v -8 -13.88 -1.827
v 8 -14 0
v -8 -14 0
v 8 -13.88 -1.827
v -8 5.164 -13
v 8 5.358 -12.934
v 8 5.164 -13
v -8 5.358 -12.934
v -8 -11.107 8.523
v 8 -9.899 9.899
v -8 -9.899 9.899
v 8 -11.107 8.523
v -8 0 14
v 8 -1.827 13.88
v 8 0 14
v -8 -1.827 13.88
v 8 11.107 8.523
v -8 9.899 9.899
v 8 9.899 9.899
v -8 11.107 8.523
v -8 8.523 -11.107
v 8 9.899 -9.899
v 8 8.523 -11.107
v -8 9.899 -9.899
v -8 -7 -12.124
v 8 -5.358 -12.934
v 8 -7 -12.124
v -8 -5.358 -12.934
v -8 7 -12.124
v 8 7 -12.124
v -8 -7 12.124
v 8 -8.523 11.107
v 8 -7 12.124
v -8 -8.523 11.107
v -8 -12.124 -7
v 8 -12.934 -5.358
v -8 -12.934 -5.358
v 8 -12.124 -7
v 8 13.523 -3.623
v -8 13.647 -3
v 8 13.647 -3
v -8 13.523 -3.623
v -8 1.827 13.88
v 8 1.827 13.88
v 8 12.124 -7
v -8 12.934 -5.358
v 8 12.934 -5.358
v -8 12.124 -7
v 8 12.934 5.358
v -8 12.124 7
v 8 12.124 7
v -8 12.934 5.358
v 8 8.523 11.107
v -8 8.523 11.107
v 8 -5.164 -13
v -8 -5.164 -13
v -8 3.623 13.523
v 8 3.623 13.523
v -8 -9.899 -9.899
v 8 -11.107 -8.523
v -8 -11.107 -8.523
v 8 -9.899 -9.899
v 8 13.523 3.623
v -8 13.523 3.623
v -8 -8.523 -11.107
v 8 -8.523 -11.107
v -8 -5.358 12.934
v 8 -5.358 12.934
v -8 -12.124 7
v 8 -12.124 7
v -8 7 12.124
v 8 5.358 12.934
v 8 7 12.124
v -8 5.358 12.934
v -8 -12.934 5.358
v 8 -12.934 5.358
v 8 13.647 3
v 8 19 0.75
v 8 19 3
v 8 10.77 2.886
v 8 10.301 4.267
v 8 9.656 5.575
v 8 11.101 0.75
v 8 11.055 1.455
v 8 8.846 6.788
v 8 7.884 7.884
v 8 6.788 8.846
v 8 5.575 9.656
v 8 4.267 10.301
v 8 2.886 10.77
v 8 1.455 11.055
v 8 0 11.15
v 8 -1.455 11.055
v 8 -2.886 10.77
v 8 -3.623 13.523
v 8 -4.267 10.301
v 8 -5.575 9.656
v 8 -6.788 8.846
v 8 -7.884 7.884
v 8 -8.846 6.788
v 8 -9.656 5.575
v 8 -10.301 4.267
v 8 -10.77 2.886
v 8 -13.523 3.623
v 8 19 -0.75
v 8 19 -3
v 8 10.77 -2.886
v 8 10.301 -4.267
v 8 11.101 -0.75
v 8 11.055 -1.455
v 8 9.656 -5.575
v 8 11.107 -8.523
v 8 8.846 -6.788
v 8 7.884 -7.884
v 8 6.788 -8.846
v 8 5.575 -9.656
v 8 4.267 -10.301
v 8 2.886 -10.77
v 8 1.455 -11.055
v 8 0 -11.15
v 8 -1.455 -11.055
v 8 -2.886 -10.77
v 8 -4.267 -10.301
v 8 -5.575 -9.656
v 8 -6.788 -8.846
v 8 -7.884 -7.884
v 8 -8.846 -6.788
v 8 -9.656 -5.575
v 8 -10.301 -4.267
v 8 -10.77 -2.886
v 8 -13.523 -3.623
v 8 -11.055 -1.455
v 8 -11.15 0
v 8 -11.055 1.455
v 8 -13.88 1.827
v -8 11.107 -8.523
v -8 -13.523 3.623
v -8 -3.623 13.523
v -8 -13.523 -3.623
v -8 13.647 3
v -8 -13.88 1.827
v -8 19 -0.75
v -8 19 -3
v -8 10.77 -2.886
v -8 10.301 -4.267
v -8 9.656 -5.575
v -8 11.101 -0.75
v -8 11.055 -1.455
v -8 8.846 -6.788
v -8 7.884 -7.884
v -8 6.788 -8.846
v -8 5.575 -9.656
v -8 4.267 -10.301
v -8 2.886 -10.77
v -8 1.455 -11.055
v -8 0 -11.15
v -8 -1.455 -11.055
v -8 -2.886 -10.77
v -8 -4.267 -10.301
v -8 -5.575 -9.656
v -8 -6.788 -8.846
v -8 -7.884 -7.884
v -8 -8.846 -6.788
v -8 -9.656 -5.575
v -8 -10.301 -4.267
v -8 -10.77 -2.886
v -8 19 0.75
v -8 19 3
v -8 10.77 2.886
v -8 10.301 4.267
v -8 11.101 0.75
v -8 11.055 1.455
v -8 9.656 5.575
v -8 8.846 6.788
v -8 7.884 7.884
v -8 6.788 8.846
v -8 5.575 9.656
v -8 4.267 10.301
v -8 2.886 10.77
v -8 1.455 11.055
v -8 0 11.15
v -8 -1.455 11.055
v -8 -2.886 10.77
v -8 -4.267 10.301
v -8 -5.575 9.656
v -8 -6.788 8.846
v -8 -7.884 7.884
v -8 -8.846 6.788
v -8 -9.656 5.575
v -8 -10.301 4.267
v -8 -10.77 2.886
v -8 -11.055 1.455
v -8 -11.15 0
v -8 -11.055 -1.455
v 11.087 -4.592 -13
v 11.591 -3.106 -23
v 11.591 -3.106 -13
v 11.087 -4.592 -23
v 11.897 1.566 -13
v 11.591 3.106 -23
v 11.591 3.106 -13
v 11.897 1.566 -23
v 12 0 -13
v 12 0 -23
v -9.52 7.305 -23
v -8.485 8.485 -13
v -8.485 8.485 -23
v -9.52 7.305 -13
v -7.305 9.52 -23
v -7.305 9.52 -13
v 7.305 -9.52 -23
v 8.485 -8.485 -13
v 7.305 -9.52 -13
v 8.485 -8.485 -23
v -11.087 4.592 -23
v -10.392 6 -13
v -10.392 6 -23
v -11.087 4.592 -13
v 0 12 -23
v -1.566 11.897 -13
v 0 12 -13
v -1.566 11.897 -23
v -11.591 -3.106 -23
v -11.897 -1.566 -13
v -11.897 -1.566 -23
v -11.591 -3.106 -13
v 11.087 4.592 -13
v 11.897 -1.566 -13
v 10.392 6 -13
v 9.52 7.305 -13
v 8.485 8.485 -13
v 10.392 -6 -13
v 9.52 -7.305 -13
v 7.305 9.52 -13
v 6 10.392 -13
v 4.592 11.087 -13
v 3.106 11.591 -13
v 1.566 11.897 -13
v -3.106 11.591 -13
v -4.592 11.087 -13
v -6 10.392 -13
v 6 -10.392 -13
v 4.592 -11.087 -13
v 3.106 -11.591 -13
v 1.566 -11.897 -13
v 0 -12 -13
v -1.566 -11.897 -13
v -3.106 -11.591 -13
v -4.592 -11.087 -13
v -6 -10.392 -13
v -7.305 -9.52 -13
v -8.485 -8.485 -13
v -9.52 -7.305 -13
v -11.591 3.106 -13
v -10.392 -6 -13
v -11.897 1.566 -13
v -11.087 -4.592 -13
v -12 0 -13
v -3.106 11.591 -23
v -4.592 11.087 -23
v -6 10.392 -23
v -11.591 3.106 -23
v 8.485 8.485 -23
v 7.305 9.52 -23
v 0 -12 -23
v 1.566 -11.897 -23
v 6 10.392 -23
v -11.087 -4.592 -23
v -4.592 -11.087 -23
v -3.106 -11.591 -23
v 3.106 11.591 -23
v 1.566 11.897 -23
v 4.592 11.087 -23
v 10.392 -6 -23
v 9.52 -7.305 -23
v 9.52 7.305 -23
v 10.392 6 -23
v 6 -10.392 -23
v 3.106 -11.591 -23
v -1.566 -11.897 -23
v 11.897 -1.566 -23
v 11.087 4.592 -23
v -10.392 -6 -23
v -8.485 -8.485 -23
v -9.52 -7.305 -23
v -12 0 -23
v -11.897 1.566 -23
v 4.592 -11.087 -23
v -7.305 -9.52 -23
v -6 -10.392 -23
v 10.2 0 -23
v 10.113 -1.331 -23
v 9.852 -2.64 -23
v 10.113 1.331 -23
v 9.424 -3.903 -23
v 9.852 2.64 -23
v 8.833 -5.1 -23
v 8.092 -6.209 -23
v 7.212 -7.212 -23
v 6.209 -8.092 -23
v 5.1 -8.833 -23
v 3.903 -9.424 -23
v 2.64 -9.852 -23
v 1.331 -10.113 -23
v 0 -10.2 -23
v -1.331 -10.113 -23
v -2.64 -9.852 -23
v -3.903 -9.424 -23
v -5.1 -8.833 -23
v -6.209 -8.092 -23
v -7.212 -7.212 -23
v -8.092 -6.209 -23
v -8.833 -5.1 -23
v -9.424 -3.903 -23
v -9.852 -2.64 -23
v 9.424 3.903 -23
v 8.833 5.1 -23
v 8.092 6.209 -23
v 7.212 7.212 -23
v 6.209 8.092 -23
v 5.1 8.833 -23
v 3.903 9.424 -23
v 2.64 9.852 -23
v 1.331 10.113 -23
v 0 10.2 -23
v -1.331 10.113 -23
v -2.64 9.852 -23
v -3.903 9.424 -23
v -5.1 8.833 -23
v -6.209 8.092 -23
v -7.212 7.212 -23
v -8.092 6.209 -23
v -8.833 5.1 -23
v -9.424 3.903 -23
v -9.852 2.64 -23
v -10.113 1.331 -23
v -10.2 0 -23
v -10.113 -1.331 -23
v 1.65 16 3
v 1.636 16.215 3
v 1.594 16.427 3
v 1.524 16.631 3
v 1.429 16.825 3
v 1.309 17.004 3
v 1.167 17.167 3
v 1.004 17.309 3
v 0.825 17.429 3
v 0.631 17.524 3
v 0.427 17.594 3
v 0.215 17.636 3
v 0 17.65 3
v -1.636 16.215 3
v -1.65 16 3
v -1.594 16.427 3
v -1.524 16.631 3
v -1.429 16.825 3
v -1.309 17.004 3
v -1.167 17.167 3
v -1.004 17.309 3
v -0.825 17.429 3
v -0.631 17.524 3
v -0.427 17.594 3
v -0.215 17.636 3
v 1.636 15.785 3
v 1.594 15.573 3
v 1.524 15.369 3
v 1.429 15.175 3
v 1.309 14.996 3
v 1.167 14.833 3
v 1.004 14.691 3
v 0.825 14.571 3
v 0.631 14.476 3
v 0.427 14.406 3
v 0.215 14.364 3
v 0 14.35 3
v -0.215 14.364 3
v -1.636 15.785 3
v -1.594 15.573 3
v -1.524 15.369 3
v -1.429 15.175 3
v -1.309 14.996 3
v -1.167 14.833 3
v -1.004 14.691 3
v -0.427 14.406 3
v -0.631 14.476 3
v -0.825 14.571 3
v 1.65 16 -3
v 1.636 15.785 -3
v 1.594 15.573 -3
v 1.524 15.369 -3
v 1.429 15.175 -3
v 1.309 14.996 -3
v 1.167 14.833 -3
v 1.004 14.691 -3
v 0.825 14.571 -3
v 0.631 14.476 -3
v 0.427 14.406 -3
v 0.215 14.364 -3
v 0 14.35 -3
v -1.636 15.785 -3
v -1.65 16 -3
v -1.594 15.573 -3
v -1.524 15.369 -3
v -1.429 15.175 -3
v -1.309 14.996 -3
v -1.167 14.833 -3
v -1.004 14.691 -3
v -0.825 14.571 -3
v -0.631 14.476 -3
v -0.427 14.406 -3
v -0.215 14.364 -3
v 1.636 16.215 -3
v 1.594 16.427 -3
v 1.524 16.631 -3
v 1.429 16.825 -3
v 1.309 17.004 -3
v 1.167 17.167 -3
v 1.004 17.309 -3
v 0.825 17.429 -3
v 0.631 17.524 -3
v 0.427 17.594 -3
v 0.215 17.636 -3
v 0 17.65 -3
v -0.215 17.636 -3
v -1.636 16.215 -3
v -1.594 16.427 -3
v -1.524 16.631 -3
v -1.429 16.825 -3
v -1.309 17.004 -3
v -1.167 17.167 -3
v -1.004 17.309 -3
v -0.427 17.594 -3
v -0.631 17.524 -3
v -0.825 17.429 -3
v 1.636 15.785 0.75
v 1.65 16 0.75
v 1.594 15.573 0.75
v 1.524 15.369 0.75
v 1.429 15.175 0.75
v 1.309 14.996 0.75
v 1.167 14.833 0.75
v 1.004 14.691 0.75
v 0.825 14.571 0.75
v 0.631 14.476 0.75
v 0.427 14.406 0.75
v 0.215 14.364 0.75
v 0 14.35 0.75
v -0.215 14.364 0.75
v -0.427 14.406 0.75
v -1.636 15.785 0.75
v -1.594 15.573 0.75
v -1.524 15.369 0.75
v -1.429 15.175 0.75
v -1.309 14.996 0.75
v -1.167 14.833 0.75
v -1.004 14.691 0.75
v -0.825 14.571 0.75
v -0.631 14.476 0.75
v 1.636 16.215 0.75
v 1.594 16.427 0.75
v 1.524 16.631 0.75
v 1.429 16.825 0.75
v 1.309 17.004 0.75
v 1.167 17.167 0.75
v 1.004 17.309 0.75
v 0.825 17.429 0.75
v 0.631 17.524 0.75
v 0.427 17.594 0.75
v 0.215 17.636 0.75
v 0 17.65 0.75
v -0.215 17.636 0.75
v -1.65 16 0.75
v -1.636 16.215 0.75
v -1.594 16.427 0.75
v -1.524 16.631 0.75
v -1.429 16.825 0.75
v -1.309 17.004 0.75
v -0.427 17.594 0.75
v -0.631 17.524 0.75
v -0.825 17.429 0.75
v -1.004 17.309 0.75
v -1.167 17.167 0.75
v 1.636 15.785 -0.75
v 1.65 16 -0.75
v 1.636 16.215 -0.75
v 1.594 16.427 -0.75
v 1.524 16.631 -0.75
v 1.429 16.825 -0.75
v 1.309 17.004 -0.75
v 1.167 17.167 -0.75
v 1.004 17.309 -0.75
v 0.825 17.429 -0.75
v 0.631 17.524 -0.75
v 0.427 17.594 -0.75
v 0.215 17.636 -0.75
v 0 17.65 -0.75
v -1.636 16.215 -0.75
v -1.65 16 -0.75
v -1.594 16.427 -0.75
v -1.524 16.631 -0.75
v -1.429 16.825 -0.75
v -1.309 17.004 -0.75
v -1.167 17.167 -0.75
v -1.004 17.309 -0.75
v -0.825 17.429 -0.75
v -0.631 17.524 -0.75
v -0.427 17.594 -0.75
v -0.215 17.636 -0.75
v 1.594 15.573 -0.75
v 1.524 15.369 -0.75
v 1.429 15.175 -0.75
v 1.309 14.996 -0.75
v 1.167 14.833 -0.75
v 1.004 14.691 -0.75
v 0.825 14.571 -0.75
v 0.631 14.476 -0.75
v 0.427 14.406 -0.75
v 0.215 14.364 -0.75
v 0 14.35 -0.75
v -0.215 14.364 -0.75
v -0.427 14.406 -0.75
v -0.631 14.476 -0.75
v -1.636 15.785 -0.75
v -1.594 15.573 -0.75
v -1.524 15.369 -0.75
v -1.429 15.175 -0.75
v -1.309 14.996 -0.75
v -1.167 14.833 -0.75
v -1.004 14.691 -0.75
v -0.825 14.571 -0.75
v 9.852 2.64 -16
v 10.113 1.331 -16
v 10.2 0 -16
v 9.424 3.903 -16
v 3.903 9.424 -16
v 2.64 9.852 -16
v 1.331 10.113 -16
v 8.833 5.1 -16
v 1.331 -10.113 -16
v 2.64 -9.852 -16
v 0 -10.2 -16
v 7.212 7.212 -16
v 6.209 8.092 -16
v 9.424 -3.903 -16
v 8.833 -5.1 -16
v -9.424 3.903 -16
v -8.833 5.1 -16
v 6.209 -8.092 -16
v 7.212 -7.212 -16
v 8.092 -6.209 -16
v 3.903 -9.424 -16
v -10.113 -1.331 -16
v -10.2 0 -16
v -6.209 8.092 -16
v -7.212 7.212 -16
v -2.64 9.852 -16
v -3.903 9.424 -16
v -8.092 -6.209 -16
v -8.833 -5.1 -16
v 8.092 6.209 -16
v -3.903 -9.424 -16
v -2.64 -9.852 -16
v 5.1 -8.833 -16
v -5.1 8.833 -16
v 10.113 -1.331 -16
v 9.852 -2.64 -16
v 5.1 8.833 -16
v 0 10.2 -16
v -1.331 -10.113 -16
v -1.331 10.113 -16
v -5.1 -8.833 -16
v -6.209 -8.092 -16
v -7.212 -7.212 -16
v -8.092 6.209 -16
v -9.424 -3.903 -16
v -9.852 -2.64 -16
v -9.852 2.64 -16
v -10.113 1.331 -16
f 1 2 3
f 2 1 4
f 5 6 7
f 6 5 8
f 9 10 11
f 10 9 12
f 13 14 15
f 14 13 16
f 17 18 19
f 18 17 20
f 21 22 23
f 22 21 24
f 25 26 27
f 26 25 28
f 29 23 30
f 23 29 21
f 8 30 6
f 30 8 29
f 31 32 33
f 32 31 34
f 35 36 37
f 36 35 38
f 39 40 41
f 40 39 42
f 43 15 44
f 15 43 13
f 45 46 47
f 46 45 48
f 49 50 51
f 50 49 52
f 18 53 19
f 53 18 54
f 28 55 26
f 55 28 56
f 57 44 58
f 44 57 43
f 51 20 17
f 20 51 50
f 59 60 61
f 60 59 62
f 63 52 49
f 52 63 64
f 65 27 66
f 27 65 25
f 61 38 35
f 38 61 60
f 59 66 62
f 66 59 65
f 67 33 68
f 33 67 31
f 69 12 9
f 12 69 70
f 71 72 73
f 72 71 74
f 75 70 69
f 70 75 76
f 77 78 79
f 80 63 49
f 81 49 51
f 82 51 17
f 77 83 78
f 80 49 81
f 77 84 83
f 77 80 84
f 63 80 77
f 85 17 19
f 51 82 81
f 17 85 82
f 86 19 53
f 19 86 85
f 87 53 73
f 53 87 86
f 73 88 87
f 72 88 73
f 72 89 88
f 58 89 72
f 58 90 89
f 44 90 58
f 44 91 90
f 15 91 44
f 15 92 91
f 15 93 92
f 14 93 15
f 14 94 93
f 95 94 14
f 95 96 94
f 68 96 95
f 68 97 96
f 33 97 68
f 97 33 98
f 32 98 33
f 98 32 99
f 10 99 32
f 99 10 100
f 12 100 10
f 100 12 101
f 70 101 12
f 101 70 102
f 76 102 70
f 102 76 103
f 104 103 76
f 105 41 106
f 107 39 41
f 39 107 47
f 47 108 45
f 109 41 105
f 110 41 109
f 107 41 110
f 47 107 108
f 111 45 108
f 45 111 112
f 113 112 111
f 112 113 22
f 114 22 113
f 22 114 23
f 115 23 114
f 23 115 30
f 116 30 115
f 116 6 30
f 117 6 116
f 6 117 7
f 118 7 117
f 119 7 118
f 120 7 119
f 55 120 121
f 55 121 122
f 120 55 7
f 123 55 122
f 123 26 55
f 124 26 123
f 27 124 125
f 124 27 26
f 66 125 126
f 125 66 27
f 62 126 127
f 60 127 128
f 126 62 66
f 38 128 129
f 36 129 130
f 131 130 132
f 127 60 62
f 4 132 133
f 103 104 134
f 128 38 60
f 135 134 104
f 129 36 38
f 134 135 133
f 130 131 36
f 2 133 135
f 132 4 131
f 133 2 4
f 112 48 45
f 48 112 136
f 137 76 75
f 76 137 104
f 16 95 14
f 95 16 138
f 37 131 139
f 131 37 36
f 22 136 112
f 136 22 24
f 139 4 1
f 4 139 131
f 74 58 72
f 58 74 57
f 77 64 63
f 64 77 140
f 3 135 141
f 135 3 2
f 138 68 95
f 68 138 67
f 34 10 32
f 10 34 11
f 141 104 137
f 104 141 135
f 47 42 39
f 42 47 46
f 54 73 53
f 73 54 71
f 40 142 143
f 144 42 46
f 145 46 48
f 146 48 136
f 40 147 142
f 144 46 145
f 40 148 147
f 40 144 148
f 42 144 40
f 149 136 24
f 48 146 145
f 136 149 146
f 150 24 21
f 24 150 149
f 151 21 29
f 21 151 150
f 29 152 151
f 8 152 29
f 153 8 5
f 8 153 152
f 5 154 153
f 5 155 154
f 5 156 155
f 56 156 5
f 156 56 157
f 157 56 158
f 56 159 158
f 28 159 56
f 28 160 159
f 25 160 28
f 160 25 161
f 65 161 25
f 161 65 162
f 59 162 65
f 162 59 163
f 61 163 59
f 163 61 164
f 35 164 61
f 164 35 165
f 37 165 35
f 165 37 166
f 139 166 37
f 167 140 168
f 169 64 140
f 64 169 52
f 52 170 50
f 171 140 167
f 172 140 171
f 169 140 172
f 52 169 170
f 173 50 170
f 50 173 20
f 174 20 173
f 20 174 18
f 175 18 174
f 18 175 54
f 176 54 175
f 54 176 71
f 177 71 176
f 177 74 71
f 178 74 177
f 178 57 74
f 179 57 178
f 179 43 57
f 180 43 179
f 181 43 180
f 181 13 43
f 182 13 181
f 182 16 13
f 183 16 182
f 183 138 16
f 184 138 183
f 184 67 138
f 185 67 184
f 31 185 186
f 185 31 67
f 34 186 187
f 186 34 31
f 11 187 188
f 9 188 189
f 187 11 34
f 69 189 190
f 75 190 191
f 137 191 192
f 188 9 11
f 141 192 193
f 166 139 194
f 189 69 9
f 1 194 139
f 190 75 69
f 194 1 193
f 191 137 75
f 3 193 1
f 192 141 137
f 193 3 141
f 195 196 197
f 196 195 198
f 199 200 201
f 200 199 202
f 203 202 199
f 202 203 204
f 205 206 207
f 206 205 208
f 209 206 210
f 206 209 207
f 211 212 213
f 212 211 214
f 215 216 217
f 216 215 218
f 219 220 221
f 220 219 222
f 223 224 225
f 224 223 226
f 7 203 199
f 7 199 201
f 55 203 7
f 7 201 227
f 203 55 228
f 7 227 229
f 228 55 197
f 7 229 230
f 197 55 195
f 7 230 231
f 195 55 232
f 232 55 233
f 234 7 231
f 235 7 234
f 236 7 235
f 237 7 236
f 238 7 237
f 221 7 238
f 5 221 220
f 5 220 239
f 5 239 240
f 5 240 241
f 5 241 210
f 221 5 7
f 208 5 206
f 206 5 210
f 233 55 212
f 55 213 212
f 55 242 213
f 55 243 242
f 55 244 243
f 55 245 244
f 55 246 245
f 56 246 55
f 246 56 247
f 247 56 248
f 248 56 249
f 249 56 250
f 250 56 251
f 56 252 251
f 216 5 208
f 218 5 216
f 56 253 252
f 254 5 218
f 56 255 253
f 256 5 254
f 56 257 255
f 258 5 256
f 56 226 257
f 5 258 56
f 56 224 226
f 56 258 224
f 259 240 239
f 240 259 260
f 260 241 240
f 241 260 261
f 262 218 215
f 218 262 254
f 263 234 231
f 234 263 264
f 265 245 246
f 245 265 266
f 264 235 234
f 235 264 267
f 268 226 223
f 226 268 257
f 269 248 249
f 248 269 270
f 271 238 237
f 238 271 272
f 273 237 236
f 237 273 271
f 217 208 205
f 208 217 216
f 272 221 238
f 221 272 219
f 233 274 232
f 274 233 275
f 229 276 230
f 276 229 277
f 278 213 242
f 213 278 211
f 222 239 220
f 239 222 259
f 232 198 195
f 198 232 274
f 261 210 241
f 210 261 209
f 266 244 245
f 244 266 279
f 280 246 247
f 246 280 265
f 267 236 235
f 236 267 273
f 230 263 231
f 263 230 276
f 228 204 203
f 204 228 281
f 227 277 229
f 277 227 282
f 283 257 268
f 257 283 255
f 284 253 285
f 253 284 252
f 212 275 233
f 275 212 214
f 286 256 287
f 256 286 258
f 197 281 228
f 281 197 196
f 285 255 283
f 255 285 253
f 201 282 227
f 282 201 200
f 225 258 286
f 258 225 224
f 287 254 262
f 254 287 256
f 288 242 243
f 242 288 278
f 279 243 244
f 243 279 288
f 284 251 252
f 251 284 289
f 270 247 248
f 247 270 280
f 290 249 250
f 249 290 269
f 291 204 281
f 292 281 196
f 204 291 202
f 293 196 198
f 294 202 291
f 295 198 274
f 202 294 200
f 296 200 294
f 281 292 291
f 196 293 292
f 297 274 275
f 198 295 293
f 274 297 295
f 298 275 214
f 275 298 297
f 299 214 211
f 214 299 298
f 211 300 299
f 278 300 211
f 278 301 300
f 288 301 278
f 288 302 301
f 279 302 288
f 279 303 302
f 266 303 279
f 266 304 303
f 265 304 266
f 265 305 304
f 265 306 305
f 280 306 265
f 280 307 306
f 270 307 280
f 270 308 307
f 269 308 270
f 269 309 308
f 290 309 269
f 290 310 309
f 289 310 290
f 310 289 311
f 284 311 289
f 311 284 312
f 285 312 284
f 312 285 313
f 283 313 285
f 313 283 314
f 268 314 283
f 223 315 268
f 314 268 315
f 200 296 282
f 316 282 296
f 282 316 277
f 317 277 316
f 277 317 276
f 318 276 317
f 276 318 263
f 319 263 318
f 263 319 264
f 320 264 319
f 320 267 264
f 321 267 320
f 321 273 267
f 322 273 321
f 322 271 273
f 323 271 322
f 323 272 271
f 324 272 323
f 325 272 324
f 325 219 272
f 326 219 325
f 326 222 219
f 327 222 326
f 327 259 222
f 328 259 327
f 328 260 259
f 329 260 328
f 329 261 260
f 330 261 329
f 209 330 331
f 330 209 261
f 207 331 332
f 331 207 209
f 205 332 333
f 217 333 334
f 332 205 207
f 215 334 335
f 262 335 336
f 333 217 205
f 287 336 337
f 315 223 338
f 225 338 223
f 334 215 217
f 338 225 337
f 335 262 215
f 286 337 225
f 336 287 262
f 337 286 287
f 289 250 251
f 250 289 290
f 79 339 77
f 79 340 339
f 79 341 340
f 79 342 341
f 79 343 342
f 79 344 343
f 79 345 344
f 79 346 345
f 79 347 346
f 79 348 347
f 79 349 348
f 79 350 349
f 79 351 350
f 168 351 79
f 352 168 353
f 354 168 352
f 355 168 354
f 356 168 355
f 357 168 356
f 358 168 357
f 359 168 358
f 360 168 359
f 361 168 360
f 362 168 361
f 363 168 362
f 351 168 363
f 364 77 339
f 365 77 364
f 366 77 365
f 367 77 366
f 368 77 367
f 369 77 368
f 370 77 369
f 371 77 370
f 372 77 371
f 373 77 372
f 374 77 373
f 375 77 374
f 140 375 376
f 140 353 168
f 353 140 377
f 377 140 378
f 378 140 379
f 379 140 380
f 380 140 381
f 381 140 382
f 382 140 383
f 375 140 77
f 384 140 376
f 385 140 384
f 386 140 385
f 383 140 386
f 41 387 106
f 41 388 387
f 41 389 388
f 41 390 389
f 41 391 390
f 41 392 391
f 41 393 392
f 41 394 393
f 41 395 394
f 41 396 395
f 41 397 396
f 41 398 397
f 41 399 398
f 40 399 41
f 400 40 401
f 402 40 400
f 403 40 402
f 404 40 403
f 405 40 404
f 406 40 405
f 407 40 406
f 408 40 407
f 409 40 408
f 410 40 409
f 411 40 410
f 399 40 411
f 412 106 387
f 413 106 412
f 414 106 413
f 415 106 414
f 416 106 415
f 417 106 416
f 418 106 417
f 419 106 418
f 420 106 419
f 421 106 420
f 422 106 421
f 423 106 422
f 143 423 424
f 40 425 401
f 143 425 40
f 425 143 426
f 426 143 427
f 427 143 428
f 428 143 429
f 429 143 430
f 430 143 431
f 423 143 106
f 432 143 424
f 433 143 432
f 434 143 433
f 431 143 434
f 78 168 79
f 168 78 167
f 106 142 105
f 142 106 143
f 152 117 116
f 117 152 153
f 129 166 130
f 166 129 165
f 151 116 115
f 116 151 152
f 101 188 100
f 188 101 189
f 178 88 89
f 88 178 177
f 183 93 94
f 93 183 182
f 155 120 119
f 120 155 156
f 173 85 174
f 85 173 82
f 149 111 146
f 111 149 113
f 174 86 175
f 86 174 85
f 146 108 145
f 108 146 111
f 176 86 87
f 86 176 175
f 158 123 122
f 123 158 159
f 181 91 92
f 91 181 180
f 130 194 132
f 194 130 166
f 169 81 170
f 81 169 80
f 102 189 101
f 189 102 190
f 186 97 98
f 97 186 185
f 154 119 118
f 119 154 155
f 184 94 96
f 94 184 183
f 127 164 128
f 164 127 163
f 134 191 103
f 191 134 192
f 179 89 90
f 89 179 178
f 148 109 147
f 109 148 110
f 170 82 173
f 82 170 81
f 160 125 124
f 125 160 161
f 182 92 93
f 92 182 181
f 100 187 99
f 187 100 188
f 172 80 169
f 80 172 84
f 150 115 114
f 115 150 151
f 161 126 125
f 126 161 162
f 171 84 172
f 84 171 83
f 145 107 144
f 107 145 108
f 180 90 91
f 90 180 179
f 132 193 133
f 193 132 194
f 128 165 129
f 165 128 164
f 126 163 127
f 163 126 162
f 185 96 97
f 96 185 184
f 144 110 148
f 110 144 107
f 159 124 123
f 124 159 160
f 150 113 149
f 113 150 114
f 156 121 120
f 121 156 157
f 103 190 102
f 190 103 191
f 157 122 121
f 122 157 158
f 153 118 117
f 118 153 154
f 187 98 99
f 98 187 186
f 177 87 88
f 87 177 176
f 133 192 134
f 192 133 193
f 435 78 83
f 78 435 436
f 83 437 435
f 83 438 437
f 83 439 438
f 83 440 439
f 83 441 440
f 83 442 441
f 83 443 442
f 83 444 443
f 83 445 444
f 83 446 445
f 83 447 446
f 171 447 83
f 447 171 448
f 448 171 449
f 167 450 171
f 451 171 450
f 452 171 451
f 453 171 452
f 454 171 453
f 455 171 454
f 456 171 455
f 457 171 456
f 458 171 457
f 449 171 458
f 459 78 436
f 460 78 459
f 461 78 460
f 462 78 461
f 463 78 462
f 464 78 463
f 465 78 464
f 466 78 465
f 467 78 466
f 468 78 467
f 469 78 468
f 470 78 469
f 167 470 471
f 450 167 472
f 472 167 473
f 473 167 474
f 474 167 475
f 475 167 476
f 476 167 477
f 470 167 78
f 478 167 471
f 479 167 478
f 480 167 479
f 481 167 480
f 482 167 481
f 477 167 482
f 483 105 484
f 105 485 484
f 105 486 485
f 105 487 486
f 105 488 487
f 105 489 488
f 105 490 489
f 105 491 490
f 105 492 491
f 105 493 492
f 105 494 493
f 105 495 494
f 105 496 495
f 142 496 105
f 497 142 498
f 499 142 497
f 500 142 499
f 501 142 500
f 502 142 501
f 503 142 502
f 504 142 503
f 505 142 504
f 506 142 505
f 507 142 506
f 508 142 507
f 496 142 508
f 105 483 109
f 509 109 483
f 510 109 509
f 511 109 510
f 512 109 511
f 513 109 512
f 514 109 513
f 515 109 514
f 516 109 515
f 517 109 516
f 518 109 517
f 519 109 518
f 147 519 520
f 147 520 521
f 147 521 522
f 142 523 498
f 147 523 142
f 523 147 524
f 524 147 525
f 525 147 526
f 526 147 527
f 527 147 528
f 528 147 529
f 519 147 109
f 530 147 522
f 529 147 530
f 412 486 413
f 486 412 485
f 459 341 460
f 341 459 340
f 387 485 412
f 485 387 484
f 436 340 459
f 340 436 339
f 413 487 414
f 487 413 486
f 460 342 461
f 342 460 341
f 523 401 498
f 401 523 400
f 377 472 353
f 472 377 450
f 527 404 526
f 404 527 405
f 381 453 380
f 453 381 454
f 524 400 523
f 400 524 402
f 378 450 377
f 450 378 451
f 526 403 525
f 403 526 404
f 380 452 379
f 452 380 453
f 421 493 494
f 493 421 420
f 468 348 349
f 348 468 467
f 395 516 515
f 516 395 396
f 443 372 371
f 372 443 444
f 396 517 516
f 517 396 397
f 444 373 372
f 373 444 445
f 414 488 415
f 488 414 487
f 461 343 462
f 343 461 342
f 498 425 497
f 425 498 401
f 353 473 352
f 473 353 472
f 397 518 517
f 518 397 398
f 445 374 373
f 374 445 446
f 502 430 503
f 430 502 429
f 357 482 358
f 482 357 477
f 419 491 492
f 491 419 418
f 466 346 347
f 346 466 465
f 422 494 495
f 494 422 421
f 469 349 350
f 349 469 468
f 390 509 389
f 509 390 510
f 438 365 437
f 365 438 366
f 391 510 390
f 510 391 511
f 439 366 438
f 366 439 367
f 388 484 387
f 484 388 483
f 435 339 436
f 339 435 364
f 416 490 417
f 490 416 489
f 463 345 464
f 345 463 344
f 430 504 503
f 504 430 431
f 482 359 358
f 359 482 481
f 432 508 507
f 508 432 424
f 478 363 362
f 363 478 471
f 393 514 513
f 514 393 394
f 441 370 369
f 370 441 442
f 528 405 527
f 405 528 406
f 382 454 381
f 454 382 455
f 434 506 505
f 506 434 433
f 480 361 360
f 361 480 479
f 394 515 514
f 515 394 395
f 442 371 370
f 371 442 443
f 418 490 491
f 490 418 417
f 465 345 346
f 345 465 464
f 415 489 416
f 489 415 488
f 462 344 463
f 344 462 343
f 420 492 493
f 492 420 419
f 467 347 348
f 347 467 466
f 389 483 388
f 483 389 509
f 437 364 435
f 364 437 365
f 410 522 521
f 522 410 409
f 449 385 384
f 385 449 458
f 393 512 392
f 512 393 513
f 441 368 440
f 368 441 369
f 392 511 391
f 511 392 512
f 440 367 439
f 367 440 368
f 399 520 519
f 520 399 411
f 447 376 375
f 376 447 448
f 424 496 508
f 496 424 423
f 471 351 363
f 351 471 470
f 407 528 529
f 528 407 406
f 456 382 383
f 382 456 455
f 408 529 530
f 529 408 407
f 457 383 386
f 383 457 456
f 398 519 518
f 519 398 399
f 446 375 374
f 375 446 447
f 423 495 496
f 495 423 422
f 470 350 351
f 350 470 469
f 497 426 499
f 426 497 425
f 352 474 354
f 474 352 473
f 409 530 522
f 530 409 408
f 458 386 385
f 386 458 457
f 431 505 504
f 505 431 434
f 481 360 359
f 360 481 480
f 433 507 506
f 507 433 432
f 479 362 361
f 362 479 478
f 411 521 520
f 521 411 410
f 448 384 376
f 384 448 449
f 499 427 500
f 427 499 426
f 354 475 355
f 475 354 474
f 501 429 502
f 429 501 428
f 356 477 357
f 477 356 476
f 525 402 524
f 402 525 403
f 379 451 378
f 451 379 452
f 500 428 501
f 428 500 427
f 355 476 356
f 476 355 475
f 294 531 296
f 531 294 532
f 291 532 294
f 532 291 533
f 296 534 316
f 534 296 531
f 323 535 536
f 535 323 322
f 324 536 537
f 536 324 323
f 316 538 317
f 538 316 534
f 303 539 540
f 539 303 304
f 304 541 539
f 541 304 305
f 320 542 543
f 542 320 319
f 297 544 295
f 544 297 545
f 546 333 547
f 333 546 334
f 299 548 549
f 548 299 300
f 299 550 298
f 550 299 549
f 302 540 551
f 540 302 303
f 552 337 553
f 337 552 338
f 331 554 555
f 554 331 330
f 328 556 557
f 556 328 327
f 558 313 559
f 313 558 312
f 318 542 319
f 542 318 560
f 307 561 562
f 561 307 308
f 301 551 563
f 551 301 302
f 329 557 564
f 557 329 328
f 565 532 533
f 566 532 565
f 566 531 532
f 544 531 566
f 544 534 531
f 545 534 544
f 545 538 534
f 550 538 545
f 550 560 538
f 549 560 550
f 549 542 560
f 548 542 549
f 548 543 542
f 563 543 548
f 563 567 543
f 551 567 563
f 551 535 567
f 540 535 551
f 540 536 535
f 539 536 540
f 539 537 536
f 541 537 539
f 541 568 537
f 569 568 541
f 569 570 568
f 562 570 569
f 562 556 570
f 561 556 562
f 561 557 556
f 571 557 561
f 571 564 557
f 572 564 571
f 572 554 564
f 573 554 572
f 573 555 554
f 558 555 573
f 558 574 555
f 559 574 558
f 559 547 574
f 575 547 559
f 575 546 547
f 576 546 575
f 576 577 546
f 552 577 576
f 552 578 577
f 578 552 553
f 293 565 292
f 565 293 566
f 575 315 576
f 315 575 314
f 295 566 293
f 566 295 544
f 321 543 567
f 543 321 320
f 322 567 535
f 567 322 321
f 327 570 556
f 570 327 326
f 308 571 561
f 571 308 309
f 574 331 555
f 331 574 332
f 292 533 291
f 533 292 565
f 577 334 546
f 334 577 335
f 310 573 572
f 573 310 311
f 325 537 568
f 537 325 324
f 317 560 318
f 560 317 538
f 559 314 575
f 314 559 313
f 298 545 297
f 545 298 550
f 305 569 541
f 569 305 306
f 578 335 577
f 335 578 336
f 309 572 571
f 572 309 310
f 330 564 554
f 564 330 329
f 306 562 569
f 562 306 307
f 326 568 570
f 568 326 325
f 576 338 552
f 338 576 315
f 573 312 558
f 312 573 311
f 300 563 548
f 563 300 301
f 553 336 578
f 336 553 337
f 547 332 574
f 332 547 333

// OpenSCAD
// file: ../common/ds_lib.scad
// DronSwarm · librería común de piezas del frame (S07-S08). Unidades: mm.
//
// Reglas (ADR-003): sin hull()/minkowski()/offset() — FreeCAD los convierte en malla y el STEP deja de ser un
// sólido válido. Las formas redondeadas se arman con uniones de cubos y cilindros. El importador CSG de FreeCAD
// también falla con booleanas 2D y con varios operandos agrupados bajo una sola transformación: cada grupo de
// agujeros debe ser hijo directo del difference(), con su propio translate.
//
// Interfaz de motor DronSwarm (DMI, ADR-011): placa con 4 ranuras radiales a 90°, de modo que el mismo soporte
// acepta varios patrones comerciales y, más adelante, el motor propio (S17+) se diseña para caer en el mismo rango.
//   DMI-S: 4×M3, círculo de tornillos Ø16-Ø25 (motores 28xx-41xx, ≤ 600 W)
//   DMI-L: 4×M4, círculo de tornillos Ø30-Ø42 (motores 50xx-70xx, ≤ 2 kW)

$fn = 48;

M3 = 3.3; M3_HEAD = 6.0; M3_NUT = 6.4;     // pasante, cabeza, tuerca (entre caras + juego)
M4 = 4.4; M4_HEAD = 7.5;
M5 = 5.4;

function dmi_bolt(iface) = iface == "L" ? M4 : M3;
function dmi_r(iface) = iface == "L" ? [15, 21] : [8, 12.5];   // radio mínimo y máximo de las ranuras
function dmi_plate_d(iface) = iface == "L" ? 56 : 36;
function dmi_center(iface) = iface == "L" ? 16 : 10;            // eje, seguro y paso de cables

// Rectángulo con esquinas redondeadas (2D) y su extrusión
module rrect2d(size, r) {
    r2 = min(r, size[0] / 2 - 0.01, size[1] / 2 - 0.01);
    union() {
        translate([r2, 0]) square([size[0] - 2 * r2, size[1]]);
        translate([0, r2]) square([size[0], size[1] - 2 * r2]);
        for (x = [r2, size[0] - r2], y = [r2, size[1] - r2]) translate([x, y]) circle(r = r2);
    }
}
// Caja redondeada con primitivas 3D (sin booleanas 2D: el importador CSG de FreeCAD falla con ellas)
module rbox(size, r) {
    r2 = min(r, size[0] / 2 - 0.01, size[1] / 2 - 0.01);
    union() {
        translate([r2, 0, 0]) cube([size[0] - 2 * r2, size[1], size[2]]);
        translate([0, r2, 0]) cube([size[0], size[1] - 2 * r2, size[2]]);
        for (x = [r2, size[0] - r2], y = [r2, size[1] - r2]) translate([x, y, 0]) cylinder(r = r2, h = size[2]);
    }
}
module crbox(size, r) { translate([-size[0] / 2, -size[1] / 2, 0]) rbox(size, r); }   // centrado en x/y

// Ranura (2D) entre dos puntos sobre el eje x
module slot2d(r0, r1, w) {
    union() {
        translate([r0, -w / 2]) square([r1 - r0, w]);
        translate([r0, 0]) circle(d = w);
        translate([r1, 0]) circle(d = w);
    }
}

// Agujeros de la interfaz de motor (para restar de una placa de espesor t)
module slot3d(r0, r1, w, h) {
    union() {
        translate([r0, -w / 2, 0]) cube([r1 - r0, w, h]);
        translate([r0, 0, 0]) cylinder(d = w, h = h);
        translate([r1, 0, 0]) cylinder(d = w, h = h);
    }
}
module dmi_holes(iface, t) {
    r = dmi_r(iface);
    translate([0, 0, -1]) union() {
        cylinder(d = dmi_center(iface), h = t + 2);
        for (a = [45, 135, 225, 315]) rotate(a) slot3d(r[0], r[1], dmi_bolt(iface), t + 2);
    }
}

// Soporte de motor en la punta del brazo: manguito sobre el tubo + placa DMI arriba
//   el tubo entra por -x; la placa queda centrada en el eje del motor (origen), cara superior en z = 0
module motor_mount(tube_d, iface = "S", sleeve = 34, wall = 3.5) {
    od = tube_d + 2 * wall;
    pd = dmi_plate_d(iface);
    pt = iface == "L" ? 6 : 4;
    zc = -pt - tube_d / 2 - 1;                 // eje del tubo bajo la placa
    difference() {
        union() {
            translate([0, 0, -pt]) cylinder(d = pd, h = pt);                         // placa DMI
            translate([-sleeve - pd / 2 + 6, 0, zc]) rotate([0, 90, 0])
                cylinder(d = od, h = sleeve + pd / 2 - 6 + 4);                       // manguito
            translate([-sleeve - pd / 2 + 6, -od / 2, zc]) cube([sleeve + pd / 2 - 2, od, -zc - pt + 0.01]);  // alma
            translate([-sleeve - pd / 2 + 6, -5, zc - od / 2 - 7]) cube([sleeve, 10, 8]);   // oreja de apriete
        }
        dmi_holes(iface, pt + 0.02, $fn = 32);
        translate([-sleeve - pd / 2 + 5, 0, zc]) rotate([0, 90, 0]) cylinder(d = tube_d + 0.3, h = sleeve + pd / 2 - 3); // tubo
        translate([-sleeve - pd / 2 + 4, -1, zc - od / 2 - 8]) cube([sleeve + 1, 2, od / 2 + 6]);   // ranura de apriete
        for (x = [0.3, 0.75]) translate([-sleeve - pd / 2 + 6 + x * sleeve, 0, zc - od / 2 - 3])
            rotate([90, 0, 0]) cylinder(d = M3, h = 30, center = true);                // tornillos de apriete
        translate([-pd / 2 - 2, 0, zc]) rotate([0, 90, 0]) cylinder(d = 7, h = pd);   // salida de cables del tubo
    }
}

// Bloque de brazo entre las dos placas centrales (impreso PA12-CF): sujeta el tubo y separa las placas.
//   el tubo sale por +x desde el origen; el bloque ocupa x ∈ [-len, 0], altura = gap
module arm_block(tube_d, gap, len = 40, width = 0, bolt = M3) {
    w = width > 0 ? width : tube_d + 14;
    difference() {
        translate([-len, -w / 2, 0]) rbox([len, w, gap], 2);
        translate([-len - 1, 0, gap / 2]) rotate([0, 90, 0]) cylinder(d = tube_d + 0.2, h = len + 2);   // tubo
        translate([-len - 1, -0.75, gap / 2]) cube([len + 2, 1.5, gap / 2 + 1]);                        // ranura de apriete
        for (p = arm_block_bolts(tube_d, len, w)) translate([p[0], p[1], -1]) cylinder(d = bolt, h = gap + 2);
        translate([-len * 0.5, 0, gap * 0.78]) rotate([90, 0, 0]) cylinder(d = M3, h = w + 2, center = true);  // apriete
    }
}
function arm_block_bolts(tube_d, len, w) =
    [for (x = [-len + 6, -6], y = [-(w / 2 - 3.6), w / 2 - 3.6]) [x, y]];

// Patrón de controladora de vuelo (agujeros M3 en cuadrado)
module fc_holes(pattern, t) {
    for (x = [-1, 1], y = [-1, 1]) translate([x * pattern / 2, y * pattern / 2, -1]) cylinder(d = M3, h = t + 2);
}
// file: ds_d_params.scad
// DS-D · parámetros generados por tools/cad/gen_cad_params.py el 2026-10-19
// desde engineering/data/results (spec v1). No editar a mano: regenerar. Unidades: mm, kg.

vehicle = "DS-D";
rotors = 6;
wheelbase = 1453;
arm_radius = 726.5;
prop_d = 660.4;
tube_od = 22;
tube_wall = 1.5;
arm_len = 545;
plate_d = 363.2;
plate_t = 3;
plate_gap = 28;
motor_iface = "L";
battery_dims = [220, 134.4, 76.2];
battery = "12S5P P42A";
leg_h = 420;
fold_arms = true;
mtow_kg = 15.61;
motor_mass_kg = 0.345;
fc_pattern = 30.5;
payload_box = [300, 240, 220];
payload_kg = 5;
// file: ds_d_frame.scad
// DS-D · geometría compartida del frame: posiciones derivadas de los parámetros (spec v1). Unidades: mm.
// Ejes: x adelante, y izquierda, z arriba. z = 0 es la cara superior de la placa inferior.
// Hexa con brazos desmontables (bloques con levas entre las placas, ADR-012), batería y carcasa arriba,
// mecanismo de liberación de la carga al centro abajo, tren de esquíes.

include <ds_d_params.scad>
use <../common/ds_lib.scad>
include <../common/ds_lib.scad>

arm_angles = [0, 60, 120, 180, 240, 300];      // igual que el SDF/PX4 (rotor 0 adelante)
// Brazos desmontables (ADR-012): el tubo entra en un bloque impreso entre las placas y se fija con 2 levas de
// apriete rápido; los cables del motor tienen un conector en el bloque. Se monta/desmonta sin herramientas.
block_len = 60;
block_w = tube_od + 20;
r_block_out = plate_d / 2 - 3;                  // cara exterior del bloque
tube_insert = 54;                               // el tubo entra hasta un tope interior
tube_z = plate_gap / 2;
tube_start = r_block_out - tube_insert;
tube_len = arm_radius - tube_start - 6;
mm_sleeve = 30;

// Arriba: batería transversal atrás y carcasa adelante. Abajo: liberación al centro, FPV adelante
battery_pos = [-60, 0];
housing_size = [130, 110, 62];
housing_pos = [90, 0];
housing_flange = 10;
housing_bolts = [for (x = [-1, 0, 1], y = [-1, 1]) [housing_pos[0] + x * (housing_size[0] / 2 + 6), y * (housing_size[1] / 2 + 6)]];   // fuera del canal de la junta
battery_tray_bolts = [for (x = [-1, 1], y = [-1, 1]) [battery_pos[0] + x * 50, y * 95]];
release_bolts = [for (x = [-1, 1], y = [-1, 1]) [x * 35, y * 20]];
cable_gland_pos = [housing_pos[0] - housing_size[0] / 2 + 20, 0];
fpv_pos = [plate_d / 2 - 30, 0];

// Tren de esquíes: 4 patas inclinadas desde la placa inferior hasta dos esquíes longitudinales (base ancha)
leg_x = 100;                                    // patas en x = ±leg_x
leg_y_top = 110;                                // arriba, bajo la placa
skid_y = 220;                                   // esquíes en y = ±skid_y
skid_len = 560;
gear_tube = 16;                                 // tubos Ø16×1
gear_wall = 1.0;
ground_z = -leg_h;
skid_z = ground_z + gear_tube / 2 + 6;          // eje del esquí (sobre su zapata de TPU de 6 mm)
gear_mount_h = 30;                              // soporte impreso bajo la placa
// pivotes: el del soporte (bajo la placa) y el de la T (eje del esquí); la pata va de uno a otro
pivot_top = [leg_y_top, -plate_t - 6];
pivot_bot = [skid_y, skid_z];
leg_dy = pivot_bot[0] - pivot_top[0];
leg_dz = pivot_top[1] - pivot_bot[1];
leg_tilt = atan(leg_dy / leg_dz);               // inclinación hacia afuera (en torno a x)
leg_in_top = 4;                                 // el tubo termina 4 mm antes del pivote del soporte
leg_in_bot = 10;                                // y 10 mm después del eje del esquí
leg_len = sqrt(leg_dy * leg_dy + leg_dz * leg_dz) - leg_in_top - leg_in_bot;
gear_mount_bolts = [for (sx = [-1, 1], sy = [-1, 1], d = [[-14, -10], [14, -10], [-14, 10], [14, 10]]) [sx * leg_x + d[0], sy * leg_y_top + d[1]]];

motor_d = motor_iface == "L" ? 62 : 38;
motor_h = motor_iface == "L" ? 36 : 26;
function block_bolts() = [for (x = [-block_len + 7, -block_len / 2, -7], y = [-1, 1]) [x, y * (block_w / 2 - 4.5)]];
// main file
// DS-D · soporte de luz anticolisión en el brazo (impreso PA12-CF, ×6): abrazadera al tubo + base de LED de 20 mm
// orientada hacia afuera y abajo (rojo a la izquierda, verde a la derecha, blanco destellante atrás).
// Local: eje del brazo = eje x en el origen.
include <ds_d_frame.scad>
module light_mount(len = 16, wall = 3) difference() {
    union() {
        translate([-len / 2, 0, 0]) rotate([0, 90, 0]) cylinder(d = tube_od + 2 * wall, h = len);
        translate([0, 0, -tube_od / 2 - 12]) cylinder(d = 24, h = 10);
        translate([-len / 2, (tube_od + 2 * wall) / 2 - 3, -3]) cube([len, 8, 6]);
    }
    translate([-len / 2 - 1, 0, 0]) rotate([0, 90, 0]) cylinder(d = tube_od + 0.3, h = len + 2);
    translate([-len / 2 - 1, 0, -0.75]) cube([len + 2, tube_od, 1.5]);
    translate([0, (tube_od + 2 * wall) / 2 + 2, 0]) cylinder(d = M3, h = 10, center = true);
    translate([0, 0, -tube_od / 2 - 13]) cylinder(d = 20.4, h = 8);                       // LED
}
light_mount();
